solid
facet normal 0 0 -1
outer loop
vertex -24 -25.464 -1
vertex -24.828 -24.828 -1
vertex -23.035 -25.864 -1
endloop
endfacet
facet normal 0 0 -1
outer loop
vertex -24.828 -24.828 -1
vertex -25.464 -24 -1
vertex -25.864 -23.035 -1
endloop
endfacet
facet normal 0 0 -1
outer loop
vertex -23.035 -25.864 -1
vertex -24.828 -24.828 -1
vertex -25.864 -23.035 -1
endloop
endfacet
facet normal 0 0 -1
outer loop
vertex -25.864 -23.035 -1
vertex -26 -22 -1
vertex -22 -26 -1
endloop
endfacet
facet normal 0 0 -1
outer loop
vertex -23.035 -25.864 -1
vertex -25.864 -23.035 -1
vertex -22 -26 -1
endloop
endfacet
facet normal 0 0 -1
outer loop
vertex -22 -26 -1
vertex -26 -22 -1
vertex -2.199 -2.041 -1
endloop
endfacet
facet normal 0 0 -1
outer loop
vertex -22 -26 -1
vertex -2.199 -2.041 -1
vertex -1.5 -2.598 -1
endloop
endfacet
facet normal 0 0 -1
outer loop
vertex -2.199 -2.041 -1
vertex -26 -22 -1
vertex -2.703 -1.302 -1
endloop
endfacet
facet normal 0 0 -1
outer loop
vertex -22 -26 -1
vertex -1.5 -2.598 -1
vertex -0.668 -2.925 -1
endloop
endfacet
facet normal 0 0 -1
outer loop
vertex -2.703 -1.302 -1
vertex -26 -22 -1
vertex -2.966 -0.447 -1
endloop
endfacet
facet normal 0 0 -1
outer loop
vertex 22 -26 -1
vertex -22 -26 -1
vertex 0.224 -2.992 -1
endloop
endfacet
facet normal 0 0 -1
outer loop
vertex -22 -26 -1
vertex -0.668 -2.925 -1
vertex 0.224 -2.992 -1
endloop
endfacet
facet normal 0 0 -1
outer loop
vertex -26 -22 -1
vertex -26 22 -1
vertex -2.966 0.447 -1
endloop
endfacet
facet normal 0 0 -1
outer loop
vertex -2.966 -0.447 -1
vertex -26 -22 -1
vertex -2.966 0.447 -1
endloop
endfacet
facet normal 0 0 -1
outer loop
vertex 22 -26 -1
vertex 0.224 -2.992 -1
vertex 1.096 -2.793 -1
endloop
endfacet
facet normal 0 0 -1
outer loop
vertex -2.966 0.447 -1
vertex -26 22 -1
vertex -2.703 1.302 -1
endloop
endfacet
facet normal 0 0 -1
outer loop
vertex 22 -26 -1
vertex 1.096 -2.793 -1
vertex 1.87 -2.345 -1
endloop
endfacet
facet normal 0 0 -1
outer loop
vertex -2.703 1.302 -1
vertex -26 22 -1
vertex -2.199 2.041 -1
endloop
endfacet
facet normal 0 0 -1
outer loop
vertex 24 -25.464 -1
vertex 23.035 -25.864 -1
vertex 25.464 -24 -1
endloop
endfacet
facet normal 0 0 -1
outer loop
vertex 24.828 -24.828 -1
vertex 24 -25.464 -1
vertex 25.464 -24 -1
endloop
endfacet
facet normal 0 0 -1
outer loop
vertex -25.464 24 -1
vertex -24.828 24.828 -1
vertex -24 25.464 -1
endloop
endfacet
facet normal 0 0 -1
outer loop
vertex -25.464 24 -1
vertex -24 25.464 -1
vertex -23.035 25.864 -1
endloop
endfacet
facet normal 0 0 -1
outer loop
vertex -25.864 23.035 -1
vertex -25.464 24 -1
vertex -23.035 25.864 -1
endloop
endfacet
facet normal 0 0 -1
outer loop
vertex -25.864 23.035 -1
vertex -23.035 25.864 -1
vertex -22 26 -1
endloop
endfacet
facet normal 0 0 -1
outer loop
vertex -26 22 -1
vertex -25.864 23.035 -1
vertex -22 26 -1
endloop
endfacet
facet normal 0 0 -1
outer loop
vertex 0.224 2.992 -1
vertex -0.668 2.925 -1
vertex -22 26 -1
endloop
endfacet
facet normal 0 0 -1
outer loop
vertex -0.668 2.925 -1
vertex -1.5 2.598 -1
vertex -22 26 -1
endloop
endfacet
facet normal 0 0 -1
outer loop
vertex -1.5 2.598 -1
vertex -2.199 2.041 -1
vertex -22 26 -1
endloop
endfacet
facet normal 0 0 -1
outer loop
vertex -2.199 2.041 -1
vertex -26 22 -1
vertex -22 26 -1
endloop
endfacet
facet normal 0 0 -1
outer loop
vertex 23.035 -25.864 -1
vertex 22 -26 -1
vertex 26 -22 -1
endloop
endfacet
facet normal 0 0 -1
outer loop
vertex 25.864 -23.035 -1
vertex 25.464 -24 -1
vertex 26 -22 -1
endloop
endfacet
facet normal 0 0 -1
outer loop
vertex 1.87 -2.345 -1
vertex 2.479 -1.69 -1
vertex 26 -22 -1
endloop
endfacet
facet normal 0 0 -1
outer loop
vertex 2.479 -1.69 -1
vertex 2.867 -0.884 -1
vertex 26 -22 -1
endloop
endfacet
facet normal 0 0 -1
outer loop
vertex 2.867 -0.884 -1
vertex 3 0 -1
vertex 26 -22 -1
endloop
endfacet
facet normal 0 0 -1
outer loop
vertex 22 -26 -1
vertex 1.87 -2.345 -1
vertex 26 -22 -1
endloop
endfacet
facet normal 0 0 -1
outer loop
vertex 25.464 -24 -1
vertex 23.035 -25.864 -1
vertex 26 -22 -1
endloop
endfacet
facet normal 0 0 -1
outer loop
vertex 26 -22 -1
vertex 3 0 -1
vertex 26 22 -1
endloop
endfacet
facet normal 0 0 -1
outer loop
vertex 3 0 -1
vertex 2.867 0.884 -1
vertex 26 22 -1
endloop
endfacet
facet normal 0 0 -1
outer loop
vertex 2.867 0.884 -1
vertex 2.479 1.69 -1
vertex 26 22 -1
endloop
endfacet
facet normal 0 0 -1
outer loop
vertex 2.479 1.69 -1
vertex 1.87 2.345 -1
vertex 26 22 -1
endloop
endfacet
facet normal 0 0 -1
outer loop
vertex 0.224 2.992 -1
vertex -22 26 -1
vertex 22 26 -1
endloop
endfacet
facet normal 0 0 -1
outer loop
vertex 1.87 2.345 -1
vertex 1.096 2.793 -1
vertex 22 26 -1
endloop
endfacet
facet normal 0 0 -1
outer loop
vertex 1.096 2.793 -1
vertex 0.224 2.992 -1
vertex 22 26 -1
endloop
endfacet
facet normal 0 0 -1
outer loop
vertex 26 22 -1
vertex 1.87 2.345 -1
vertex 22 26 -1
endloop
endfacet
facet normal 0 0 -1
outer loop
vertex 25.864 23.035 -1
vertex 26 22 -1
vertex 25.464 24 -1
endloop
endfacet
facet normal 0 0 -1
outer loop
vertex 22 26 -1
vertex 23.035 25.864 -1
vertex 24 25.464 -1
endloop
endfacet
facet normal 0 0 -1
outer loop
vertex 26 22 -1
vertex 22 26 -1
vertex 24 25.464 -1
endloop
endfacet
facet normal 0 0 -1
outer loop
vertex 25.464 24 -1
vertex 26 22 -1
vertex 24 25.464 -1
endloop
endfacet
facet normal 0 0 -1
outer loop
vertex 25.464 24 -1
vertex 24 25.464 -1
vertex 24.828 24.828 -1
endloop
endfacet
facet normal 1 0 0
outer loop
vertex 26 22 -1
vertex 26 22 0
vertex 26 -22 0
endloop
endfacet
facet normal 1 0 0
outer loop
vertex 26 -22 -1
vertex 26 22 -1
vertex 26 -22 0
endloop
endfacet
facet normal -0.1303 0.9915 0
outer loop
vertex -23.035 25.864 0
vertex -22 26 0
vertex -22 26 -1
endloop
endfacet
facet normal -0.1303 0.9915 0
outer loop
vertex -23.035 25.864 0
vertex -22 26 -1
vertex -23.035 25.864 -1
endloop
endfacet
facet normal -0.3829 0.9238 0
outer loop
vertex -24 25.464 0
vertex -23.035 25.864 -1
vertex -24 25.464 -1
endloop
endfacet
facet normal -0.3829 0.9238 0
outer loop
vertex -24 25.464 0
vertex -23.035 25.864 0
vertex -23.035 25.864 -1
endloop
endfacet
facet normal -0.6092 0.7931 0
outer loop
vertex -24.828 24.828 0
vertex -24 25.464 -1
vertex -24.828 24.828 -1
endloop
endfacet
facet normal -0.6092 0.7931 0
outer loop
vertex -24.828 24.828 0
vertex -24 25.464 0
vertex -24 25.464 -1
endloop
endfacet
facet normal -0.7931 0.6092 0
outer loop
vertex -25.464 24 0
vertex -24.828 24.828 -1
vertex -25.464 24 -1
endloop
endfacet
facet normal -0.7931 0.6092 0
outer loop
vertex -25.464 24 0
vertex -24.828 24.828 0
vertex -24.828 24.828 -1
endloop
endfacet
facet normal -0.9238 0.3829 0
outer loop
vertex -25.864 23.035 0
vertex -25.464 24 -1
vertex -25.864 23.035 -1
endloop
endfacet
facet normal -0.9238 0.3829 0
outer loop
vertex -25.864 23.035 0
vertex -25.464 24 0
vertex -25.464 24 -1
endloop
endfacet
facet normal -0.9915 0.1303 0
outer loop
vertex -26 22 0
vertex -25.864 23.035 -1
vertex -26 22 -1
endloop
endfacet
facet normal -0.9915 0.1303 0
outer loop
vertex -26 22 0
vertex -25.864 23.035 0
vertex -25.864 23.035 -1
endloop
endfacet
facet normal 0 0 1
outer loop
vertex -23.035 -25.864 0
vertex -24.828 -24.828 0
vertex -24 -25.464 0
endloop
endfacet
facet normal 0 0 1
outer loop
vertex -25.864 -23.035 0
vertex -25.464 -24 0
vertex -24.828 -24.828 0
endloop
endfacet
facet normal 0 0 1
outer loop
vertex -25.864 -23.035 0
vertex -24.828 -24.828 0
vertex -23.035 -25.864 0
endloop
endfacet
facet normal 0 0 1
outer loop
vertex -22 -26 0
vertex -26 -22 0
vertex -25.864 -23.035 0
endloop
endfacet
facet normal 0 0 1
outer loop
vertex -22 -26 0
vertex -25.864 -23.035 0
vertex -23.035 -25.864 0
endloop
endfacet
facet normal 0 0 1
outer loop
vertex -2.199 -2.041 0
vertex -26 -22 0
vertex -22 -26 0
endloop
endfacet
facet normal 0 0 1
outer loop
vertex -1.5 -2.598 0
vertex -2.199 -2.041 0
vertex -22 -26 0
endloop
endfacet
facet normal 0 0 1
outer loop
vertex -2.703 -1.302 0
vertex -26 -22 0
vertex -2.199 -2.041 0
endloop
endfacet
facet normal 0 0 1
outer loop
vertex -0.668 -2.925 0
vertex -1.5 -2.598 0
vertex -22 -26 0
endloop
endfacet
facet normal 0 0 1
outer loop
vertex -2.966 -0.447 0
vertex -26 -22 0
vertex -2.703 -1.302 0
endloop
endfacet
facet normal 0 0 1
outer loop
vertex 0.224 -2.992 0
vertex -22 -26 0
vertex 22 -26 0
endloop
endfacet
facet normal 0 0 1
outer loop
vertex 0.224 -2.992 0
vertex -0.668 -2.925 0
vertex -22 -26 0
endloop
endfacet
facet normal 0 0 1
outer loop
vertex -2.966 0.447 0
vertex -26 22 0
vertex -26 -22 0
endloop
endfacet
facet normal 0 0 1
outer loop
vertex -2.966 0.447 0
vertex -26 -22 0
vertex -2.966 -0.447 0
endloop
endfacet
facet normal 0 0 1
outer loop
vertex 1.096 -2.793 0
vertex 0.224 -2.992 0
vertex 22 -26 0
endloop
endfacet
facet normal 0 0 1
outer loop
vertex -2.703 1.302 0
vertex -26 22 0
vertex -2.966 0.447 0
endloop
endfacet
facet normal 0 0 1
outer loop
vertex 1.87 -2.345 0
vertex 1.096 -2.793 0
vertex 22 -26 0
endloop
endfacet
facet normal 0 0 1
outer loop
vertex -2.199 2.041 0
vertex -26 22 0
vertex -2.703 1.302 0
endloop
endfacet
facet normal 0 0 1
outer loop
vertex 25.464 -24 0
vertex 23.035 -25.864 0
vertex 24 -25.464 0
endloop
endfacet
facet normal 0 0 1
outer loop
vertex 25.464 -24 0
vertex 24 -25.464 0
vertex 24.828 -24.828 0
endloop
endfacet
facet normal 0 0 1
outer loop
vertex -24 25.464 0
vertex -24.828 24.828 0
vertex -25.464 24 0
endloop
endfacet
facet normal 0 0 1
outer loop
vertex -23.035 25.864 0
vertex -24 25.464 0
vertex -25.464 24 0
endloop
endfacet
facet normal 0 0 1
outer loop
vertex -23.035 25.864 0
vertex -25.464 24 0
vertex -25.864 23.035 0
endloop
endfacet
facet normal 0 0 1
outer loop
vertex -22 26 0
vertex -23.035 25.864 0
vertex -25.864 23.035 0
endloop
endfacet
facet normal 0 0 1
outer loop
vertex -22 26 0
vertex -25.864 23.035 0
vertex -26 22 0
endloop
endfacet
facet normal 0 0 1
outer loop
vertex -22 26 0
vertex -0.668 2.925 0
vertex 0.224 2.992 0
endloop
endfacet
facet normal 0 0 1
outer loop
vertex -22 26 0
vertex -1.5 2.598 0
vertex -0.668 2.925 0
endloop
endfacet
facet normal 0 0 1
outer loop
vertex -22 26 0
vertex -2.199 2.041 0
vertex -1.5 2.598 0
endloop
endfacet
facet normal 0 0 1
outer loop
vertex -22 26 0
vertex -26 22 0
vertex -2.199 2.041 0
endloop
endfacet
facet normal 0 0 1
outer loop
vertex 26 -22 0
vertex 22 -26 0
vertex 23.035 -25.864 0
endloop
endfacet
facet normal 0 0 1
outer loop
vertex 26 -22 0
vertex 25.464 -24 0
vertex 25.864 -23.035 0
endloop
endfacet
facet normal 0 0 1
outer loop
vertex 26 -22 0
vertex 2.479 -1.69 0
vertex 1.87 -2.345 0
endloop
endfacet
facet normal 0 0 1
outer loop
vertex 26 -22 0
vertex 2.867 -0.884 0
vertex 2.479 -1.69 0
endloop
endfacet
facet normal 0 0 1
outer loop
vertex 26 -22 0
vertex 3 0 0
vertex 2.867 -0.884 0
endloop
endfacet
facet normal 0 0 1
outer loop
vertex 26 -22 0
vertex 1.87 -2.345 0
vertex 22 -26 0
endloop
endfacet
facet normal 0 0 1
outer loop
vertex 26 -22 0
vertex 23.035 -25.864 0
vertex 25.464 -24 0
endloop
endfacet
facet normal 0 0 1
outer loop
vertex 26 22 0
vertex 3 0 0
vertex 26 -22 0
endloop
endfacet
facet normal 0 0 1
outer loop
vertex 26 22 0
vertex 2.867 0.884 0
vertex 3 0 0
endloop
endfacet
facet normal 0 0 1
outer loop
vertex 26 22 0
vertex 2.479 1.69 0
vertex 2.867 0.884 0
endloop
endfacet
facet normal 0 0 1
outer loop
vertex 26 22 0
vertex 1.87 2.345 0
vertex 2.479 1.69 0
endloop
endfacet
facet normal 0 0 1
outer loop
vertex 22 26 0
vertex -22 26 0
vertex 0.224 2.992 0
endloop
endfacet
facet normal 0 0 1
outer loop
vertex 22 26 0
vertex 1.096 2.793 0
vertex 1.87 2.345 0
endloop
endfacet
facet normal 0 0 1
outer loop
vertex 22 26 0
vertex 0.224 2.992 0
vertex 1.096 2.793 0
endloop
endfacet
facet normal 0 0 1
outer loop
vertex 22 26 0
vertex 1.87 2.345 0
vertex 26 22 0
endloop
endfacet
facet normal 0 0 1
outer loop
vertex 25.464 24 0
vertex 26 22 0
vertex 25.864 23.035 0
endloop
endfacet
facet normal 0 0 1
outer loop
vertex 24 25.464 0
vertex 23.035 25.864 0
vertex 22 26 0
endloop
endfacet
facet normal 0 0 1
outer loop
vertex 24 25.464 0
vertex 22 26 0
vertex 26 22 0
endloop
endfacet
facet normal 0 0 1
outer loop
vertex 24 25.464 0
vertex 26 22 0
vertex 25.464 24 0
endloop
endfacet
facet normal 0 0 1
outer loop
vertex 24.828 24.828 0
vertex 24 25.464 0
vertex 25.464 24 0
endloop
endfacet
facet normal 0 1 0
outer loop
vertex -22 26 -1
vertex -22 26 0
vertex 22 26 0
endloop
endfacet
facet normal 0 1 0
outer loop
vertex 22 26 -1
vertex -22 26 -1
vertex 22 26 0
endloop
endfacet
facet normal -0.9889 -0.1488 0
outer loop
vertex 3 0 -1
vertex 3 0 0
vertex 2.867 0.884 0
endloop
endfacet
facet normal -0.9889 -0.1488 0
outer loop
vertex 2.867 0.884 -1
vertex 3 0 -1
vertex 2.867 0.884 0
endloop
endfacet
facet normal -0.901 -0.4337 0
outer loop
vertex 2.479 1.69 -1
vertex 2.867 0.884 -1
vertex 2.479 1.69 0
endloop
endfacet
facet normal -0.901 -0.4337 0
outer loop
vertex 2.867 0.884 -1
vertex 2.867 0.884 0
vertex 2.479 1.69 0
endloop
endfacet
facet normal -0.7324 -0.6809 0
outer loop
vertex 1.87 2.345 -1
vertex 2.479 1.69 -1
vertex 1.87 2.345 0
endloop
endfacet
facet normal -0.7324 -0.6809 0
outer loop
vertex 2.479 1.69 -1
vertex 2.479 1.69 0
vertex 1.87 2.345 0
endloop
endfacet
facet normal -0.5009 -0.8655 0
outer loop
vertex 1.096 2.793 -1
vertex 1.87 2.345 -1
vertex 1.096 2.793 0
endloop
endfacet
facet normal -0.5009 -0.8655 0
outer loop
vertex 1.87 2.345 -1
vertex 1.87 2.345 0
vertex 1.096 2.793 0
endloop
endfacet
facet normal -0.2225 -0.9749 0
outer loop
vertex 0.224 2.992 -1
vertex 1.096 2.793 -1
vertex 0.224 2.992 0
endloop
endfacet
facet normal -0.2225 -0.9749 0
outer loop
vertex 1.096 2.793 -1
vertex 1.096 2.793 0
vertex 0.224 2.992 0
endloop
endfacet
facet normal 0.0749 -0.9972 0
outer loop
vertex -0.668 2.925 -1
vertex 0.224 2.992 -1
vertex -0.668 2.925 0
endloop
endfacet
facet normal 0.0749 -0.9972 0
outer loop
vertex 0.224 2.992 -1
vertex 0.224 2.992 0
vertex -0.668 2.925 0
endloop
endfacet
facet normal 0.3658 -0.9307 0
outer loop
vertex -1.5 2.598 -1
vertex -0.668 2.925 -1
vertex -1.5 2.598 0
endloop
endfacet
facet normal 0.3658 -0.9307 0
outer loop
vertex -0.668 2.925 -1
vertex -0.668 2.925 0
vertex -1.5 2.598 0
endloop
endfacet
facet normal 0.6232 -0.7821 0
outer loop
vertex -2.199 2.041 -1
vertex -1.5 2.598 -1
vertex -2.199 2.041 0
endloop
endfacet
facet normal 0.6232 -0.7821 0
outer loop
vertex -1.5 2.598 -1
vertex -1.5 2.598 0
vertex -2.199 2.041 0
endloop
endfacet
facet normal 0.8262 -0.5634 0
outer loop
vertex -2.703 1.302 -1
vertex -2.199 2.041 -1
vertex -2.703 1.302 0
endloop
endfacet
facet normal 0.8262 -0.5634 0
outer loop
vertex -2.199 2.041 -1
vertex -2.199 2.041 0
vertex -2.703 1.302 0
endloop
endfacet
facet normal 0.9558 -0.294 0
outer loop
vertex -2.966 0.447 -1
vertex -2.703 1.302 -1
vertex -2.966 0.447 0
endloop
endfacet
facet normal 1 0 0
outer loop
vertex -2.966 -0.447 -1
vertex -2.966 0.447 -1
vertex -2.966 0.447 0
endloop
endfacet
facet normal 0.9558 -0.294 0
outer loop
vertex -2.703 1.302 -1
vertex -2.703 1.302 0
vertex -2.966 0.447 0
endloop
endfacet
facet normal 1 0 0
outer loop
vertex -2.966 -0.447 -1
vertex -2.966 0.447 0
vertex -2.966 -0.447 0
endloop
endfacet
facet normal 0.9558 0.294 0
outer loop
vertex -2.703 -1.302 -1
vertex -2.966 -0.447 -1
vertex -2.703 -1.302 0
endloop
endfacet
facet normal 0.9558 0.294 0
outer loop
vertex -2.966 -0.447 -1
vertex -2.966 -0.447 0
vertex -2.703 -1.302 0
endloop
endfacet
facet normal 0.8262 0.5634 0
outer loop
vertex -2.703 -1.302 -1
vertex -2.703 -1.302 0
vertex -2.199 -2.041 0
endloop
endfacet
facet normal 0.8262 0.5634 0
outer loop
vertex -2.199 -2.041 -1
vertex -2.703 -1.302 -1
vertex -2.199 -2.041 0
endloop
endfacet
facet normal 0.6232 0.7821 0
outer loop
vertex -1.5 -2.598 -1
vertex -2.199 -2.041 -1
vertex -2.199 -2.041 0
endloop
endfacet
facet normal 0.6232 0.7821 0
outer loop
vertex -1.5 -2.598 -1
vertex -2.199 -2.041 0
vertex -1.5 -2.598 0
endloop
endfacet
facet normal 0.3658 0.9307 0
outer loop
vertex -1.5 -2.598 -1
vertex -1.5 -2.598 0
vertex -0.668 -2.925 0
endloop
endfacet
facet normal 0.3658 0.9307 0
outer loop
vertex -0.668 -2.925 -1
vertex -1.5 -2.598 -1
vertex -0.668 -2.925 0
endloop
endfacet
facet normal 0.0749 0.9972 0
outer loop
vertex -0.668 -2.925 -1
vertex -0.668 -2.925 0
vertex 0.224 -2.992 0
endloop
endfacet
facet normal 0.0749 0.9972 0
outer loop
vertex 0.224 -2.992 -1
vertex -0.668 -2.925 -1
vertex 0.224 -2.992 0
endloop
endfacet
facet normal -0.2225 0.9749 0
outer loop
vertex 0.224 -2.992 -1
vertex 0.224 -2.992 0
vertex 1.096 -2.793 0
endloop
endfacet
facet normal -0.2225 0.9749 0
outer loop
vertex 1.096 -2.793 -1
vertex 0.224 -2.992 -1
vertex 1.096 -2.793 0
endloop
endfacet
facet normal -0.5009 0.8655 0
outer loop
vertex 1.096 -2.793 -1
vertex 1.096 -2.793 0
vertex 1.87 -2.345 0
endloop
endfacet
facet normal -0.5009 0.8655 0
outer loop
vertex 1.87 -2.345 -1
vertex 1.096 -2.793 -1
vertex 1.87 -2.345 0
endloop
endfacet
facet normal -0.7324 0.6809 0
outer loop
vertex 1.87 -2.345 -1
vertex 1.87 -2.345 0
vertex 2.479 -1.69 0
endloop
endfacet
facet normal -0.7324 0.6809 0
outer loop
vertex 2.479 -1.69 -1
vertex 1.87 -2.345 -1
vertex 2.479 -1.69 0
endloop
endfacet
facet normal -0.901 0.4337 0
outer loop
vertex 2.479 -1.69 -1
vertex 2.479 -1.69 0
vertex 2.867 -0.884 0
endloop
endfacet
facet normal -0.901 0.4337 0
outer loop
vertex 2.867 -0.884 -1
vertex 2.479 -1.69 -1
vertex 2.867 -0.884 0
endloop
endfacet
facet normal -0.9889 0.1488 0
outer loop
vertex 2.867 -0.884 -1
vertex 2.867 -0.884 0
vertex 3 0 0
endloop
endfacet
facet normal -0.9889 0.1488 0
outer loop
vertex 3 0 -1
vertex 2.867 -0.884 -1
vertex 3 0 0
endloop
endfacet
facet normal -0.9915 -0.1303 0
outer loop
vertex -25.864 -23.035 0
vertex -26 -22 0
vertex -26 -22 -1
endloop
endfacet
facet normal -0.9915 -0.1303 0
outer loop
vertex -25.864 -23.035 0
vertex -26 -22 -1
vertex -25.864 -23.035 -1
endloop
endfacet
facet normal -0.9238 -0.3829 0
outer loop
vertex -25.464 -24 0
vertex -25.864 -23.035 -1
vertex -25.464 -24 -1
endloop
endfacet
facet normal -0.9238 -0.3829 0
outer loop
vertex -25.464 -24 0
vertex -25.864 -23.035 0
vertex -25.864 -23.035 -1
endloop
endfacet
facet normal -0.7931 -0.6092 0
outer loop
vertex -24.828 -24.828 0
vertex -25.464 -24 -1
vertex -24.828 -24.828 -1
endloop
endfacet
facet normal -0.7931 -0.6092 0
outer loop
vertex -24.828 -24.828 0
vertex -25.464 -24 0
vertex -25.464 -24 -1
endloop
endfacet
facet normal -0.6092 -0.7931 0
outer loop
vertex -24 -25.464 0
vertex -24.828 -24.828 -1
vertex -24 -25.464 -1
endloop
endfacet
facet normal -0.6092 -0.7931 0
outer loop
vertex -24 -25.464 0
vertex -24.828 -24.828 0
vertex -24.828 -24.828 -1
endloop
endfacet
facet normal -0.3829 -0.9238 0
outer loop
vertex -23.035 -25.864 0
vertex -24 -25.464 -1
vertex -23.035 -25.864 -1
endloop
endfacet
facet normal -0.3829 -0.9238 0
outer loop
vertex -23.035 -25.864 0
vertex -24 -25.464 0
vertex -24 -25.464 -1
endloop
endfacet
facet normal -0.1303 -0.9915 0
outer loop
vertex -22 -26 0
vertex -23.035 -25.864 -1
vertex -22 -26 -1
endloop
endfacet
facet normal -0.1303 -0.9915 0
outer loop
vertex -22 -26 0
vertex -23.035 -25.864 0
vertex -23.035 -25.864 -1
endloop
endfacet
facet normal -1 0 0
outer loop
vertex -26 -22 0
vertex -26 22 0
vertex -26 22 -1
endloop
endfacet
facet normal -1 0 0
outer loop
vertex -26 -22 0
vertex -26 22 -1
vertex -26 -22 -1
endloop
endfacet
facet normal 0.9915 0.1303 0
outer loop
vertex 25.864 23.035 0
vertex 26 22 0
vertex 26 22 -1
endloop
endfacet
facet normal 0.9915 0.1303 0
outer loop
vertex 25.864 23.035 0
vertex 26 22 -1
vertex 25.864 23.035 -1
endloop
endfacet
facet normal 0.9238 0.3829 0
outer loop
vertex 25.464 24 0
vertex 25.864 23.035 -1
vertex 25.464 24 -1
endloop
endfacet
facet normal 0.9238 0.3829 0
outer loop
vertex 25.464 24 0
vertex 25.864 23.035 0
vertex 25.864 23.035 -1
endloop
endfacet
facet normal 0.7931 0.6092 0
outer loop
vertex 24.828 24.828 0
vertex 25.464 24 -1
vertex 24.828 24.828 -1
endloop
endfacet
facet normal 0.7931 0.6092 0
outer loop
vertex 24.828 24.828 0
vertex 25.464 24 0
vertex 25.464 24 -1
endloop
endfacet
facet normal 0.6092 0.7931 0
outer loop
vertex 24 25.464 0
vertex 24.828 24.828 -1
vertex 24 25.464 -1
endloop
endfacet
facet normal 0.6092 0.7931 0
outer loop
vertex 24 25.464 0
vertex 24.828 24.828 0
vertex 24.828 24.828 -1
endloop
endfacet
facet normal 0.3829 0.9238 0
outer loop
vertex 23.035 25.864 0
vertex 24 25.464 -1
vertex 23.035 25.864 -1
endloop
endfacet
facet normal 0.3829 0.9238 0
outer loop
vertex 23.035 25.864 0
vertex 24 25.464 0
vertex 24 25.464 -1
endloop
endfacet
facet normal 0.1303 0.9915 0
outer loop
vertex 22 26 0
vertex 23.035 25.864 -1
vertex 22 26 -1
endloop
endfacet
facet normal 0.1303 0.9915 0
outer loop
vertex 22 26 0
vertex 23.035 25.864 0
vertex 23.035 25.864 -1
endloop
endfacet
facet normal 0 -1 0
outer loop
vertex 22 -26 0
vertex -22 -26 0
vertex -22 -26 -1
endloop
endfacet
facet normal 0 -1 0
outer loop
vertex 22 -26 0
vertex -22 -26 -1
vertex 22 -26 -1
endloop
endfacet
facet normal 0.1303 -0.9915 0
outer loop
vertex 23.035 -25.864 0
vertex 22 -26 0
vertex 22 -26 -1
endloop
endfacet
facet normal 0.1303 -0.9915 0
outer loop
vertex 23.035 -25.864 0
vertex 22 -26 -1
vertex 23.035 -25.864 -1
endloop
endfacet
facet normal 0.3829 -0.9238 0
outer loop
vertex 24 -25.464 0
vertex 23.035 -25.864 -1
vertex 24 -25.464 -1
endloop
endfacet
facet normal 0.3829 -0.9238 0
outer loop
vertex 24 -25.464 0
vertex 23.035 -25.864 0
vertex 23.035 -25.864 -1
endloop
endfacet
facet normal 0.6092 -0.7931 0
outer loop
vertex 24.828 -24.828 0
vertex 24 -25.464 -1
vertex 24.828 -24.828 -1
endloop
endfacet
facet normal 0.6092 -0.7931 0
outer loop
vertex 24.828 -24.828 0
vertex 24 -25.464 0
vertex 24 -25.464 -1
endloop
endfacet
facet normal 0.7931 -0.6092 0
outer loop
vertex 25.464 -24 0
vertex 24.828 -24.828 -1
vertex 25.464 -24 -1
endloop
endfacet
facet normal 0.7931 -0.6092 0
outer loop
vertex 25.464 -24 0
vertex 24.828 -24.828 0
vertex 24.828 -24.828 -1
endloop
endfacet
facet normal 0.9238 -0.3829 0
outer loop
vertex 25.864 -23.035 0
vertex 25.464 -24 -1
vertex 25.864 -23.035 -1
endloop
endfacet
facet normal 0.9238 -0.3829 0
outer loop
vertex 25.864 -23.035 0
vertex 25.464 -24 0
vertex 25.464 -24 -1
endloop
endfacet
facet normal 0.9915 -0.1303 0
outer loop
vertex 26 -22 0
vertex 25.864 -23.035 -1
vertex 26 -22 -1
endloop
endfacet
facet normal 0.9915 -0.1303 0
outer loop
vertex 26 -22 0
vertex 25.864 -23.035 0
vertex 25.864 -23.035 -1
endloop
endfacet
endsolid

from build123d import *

# Parameters (mm, degrees)
PAD_DEPTH    = 1
SKETCH001_R  = 3
POCKET_DEPTH = 1.001


with BuildPart() as part:
    # Sketch → Pad (new body)
    with BuildSketch(Plane.XY):
        with BuildLine():
            Line((-26, 21.999982), (-26, -21.999982))
            ThreePointArc((-26, -21.999982), (-24.828421, -24.828421), (-21.999982, -26))
            Line((-21.999982, -26), (21.999982, -26))
            ThreePointArc((21.999982, -26), (24.828422, -24.828422), (26, -21.999982))
            Line((26, 21.999982), (26, -21.999982))
            ThreePointArc((26, 21.999982), (24.828422, 24.828422), (21.999982, 26))
            Line((-21.999982, 26), (21.999982, 26))
            ThreePointArc((-21.999982, 26), (-24.828427, 24.828427), (-26, 21.999982))
        make_face()
    extrude(amount=-PAD_DEPTH)

    # Sketch001 (on Face9 of Pad) → Pocket (cut, through all)
    with BuildSketch(Plane.XY):
        Circle(SKETCH001_R)
    extrude(amount=-POCKET_DEPTH, mode=Mode.SUBTRACT)


solid = part.part
